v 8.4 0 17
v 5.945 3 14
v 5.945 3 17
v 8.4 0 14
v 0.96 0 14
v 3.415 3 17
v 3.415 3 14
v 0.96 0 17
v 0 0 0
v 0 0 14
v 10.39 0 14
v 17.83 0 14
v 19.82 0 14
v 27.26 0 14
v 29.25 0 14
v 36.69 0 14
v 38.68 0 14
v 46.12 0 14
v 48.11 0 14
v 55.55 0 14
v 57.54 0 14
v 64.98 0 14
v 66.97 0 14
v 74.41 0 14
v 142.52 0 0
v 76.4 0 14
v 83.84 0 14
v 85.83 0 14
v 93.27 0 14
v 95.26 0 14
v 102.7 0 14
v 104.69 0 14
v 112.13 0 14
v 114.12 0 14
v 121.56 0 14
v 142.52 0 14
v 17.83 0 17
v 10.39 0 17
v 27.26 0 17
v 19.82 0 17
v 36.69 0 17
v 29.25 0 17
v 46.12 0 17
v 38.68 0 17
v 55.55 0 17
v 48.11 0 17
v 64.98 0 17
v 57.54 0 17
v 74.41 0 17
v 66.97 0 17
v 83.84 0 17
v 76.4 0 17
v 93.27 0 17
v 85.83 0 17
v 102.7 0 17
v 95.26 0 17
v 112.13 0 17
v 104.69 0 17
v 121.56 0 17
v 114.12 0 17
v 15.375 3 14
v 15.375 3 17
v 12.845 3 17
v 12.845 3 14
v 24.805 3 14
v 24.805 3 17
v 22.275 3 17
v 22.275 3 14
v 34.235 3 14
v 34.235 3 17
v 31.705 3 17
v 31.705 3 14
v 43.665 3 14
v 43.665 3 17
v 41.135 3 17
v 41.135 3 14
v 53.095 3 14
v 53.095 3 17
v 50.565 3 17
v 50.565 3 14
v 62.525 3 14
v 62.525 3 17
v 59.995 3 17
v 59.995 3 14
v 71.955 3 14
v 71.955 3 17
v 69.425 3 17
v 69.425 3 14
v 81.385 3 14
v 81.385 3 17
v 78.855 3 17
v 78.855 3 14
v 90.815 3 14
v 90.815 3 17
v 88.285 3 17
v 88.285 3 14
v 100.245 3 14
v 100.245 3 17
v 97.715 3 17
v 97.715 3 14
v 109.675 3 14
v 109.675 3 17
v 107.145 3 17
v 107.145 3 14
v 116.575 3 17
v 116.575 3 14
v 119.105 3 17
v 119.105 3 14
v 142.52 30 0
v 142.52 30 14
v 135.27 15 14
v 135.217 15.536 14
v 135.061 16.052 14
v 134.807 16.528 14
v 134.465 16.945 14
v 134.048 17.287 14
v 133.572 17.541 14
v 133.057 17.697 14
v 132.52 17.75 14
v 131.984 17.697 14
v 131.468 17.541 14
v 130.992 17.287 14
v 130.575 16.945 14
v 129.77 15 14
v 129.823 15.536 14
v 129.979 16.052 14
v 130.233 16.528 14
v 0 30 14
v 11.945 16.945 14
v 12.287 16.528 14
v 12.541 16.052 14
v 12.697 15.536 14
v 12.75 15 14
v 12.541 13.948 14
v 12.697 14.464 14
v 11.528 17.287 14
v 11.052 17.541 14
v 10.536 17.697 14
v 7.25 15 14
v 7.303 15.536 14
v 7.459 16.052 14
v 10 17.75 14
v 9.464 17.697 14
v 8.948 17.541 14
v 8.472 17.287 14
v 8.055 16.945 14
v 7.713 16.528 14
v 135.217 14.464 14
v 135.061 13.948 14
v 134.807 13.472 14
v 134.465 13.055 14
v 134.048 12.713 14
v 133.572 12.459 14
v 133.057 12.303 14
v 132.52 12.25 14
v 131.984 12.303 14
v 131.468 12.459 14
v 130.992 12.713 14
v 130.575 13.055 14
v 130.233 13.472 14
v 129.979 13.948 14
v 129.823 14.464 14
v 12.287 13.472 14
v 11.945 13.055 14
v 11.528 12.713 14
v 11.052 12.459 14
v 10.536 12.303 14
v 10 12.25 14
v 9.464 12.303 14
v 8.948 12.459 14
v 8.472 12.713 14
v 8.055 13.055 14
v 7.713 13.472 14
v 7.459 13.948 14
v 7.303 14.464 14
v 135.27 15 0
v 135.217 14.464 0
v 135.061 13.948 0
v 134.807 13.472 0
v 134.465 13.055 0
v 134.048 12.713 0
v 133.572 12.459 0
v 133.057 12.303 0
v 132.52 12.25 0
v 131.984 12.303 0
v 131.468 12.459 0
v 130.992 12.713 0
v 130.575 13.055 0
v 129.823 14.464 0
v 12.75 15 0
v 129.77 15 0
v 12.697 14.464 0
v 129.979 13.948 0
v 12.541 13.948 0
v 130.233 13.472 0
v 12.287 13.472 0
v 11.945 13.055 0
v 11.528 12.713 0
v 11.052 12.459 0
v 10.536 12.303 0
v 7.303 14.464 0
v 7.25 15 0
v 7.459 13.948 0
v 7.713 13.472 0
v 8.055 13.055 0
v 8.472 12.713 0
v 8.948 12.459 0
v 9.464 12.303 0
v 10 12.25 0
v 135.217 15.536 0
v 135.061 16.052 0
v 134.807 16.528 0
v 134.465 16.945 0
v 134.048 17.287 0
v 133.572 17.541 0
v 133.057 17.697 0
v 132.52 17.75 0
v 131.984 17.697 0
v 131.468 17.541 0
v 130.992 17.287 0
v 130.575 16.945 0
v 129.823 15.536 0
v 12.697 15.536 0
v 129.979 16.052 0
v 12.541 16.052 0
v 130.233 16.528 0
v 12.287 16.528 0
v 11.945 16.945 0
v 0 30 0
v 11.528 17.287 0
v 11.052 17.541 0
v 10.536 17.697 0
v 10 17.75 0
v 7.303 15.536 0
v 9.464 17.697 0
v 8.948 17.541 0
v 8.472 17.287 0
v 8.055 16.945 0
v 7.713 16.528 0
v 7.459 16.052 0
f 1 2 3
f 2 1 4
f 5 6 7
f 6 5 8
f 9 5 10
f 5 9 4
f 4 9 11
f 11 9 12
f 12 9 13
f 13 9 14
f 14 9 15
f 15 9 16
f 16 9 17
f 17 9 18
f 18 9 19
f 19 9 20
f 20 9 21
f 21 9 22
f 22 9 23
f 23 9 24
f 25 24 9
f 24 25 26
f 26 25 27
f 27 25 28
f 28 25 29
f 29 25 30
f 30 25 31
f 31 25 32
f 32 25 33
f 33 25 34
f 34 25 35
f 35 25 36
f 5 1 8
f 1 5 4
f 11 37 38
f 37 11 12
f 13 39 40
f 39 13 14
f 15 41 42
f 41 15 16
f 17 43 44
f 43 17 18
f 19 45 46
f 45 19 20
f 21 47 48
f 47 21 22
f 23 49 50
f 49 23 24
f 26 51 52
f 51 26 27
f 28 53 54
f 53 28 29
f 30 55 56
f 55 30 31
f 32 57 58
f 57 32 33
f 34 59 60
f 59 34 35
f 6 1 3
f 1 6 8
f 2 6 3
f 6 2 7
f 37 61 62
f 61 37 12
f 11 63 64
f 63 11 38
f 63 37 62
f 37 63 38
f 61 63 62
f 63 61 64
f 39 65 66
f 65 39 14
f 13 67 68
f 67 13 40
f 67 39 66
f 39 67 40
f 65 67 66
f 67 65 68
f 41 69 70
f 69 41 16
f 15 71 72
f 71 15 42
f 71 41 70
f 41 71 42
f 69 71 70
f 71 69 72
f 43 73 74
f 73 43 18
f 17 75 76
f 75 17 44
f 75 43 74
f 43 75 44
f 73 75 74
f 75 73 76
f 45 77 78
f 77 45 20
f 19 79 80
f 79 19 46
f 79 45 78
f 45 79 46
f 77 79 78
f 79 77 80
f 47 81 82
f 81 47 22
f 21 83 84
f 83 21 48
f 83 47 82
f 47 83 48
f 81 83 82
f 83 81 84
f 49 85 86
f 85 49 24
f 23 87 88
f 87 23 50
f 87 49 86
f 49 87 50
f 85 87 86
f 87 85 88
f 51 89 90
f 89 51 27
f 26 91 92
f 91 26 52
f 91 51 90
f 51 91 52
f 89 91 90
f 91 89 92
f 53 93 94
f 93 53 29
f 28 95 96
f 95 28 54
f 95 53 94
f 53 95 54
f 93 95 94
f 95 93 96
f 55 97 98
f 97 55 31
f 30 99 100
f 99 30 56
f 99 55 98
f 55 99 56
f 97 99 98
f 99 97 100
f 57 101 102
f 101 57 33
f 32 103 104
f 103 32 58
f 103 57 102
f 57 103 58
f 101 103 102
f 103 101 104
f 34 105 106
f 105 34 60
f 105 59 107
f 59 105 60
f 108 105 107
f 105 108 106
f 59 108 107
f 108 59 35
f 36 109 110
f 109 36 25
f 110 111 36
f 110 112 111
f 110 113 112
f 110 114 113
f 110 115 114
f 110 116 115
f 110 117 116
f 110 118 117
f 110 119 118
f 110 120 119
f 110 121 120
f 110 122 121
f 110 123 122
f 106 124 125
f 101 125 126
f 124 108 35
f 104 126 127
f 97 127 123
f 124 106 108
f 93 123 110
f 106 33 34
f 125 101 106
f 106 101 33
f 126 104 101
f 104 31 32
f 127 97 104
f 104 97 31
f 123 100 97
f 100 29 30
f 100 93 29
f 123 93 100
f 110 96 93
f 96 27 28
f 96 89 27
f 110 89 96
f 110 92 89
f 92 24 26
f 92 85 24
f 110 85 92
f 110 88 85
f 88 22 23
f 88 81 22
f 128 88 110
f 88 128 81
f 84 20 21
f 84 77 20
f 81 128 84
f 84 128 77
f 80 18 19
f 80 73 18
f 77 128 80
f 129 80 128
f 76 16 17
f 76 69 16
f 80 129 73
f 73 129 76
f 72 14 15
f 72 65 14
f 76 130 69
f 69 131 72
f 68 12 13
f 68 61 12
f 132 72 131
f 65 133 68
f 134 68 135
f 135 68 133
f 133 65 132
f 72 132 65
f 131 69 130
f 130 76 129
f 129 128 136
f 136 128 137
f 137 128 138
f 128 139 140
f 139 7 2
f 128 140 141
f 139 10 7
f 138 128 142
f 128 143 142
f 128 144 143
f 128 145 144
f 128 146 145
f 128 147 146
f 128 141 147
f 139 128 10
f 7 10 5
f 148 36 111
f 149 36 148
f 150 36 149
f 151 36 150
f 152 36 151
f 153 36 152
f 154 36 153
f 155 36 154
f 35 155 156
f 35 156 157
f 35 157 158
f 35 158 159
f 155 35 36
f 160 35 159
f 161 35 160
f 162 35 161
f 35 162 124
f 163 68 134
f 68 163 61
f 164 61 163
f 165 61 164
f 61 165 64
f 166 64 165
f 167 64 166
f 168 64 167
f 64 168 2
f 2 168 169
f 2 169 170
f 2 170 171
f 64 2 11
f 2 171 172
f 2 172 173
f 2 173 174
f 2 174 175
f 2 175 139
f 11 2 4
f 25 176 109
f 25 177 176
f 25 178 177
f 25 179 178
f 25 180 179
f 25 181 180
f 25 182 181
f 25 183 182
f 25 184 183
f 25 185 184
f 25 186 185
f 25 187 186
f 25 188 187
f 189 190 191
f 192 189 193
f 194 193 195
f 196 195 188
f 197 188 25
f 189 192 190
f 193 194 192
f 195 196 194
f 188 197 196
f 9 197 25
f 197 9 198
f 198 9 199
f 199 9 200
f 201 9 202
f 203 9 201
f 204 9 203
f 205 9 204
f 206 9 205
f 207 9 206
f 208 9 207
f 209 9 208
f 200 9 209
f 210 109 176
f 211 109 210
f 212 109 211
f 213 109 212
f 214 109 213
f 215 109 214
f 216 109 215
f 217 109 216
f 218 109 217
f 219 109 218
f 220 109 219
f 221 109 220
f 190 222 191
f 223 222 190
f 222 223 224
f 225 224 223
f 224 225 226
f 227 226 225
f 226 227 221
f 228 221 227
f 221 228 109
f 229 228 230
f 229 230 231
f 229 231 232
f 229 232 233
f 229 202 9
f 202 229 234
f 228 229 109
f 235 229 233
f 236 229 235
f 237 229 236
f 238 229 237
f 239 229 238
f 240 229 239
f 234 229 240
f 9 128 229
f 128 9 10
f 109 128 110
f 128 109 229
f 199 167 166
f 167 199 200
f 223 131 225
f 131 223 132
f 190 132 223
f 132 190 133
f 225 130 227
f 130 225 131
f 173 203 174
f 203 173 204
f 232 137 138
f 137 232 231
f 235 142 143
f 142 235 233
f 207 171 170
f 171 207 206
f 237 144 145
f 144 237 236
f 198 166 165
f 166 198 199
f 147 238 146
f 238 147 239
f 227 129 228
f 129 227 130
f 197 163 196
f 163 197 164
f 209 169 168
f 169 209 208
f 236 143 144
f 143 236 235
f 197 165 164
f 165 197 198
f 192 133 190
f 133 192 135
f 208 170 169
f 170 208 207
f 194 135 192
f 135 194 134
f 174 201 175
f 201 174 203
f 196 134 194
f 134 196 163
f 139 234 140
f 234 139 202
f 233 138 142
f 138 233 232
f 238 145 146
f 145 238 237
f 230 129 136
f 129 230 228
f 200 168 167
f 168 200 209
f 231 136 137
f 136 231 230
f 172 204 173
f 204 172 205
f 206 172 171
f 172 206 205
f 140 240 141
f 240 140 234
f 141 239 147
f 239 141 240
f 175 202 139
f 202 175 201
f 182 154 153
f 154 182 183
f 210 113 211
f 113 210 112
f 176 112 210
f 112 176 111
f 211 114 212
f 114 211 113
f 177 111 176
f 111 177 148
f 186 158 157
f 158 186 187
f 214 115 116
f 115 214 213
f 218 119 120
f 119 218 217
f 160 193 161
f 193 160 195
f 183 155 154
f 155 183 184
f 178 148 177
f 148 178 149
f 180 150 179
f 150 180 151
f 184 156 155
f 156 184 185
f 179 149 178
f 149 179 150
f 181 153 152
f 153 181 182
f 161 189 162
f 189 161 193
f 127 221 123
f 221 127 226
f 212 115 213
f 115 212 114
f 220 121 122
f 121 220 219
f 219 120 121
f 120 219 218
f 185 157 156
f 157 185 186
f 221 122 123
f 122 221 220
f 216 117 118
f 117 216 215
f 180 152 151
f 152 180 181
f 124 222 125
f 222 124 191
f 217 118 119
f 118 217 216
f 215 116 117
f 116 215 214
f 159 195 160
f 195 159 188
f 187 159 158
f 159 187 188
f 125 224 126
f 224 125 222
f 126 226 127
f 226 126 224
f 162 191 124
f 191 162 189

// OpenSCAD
$fn = 32;

// ----------------------------------------------------------------------
// Gear rack: m=3 z=13, 142.52 x 30 x 17 mm
// ----------------------------------------------------------------------

// --- parameters (mm) ---
bar_len = 142.52;         // rack length, X
bar_w = 30;               // rack width, Y
bar_h = 17;               // overall height, Z
gear_module = 3;          // module
base_t = 14;              // tooth root line height
pitch = 9.43;             // circular pitch
tip_w = 2.53;             // tooth thickness at the tip
root_w = 7.44;            // tooth thickness at the root line
hole_d = 5.5;             // mounting hole
sink = 0.6;               // tooth root overlap into the body

tooth_span = 122.52;

module tooth(x0) {
  /* 20 deg flank profile, sunk into the body for a positive overlap */
  translate([x0, 0, base_t - sink])
    linear_extrude(height = bar_h - base_t + sink)
      polygon(points = [[-root_w / 2, 0], [root_w / 2, 0],
                        [tip_w / 2, bar_h - base_t],
                        [-tip_w / 2, bar_h - base_t]]);
}

difference() {
  union() {
    cube([bar_len, bar_w, base_t]);
    for (i = [0 : 13 - 1])
      tooth((i + 0.5) * pitch + (tooth_span - 13 * pitch) / 2);
  }
  translate([10, 15, -1]) cylinder(h = base_t + 2, d = hole_d);
  translate([132.52, 15, -1]) cylinder(h = base_t + 2, d = hole_d);
}
